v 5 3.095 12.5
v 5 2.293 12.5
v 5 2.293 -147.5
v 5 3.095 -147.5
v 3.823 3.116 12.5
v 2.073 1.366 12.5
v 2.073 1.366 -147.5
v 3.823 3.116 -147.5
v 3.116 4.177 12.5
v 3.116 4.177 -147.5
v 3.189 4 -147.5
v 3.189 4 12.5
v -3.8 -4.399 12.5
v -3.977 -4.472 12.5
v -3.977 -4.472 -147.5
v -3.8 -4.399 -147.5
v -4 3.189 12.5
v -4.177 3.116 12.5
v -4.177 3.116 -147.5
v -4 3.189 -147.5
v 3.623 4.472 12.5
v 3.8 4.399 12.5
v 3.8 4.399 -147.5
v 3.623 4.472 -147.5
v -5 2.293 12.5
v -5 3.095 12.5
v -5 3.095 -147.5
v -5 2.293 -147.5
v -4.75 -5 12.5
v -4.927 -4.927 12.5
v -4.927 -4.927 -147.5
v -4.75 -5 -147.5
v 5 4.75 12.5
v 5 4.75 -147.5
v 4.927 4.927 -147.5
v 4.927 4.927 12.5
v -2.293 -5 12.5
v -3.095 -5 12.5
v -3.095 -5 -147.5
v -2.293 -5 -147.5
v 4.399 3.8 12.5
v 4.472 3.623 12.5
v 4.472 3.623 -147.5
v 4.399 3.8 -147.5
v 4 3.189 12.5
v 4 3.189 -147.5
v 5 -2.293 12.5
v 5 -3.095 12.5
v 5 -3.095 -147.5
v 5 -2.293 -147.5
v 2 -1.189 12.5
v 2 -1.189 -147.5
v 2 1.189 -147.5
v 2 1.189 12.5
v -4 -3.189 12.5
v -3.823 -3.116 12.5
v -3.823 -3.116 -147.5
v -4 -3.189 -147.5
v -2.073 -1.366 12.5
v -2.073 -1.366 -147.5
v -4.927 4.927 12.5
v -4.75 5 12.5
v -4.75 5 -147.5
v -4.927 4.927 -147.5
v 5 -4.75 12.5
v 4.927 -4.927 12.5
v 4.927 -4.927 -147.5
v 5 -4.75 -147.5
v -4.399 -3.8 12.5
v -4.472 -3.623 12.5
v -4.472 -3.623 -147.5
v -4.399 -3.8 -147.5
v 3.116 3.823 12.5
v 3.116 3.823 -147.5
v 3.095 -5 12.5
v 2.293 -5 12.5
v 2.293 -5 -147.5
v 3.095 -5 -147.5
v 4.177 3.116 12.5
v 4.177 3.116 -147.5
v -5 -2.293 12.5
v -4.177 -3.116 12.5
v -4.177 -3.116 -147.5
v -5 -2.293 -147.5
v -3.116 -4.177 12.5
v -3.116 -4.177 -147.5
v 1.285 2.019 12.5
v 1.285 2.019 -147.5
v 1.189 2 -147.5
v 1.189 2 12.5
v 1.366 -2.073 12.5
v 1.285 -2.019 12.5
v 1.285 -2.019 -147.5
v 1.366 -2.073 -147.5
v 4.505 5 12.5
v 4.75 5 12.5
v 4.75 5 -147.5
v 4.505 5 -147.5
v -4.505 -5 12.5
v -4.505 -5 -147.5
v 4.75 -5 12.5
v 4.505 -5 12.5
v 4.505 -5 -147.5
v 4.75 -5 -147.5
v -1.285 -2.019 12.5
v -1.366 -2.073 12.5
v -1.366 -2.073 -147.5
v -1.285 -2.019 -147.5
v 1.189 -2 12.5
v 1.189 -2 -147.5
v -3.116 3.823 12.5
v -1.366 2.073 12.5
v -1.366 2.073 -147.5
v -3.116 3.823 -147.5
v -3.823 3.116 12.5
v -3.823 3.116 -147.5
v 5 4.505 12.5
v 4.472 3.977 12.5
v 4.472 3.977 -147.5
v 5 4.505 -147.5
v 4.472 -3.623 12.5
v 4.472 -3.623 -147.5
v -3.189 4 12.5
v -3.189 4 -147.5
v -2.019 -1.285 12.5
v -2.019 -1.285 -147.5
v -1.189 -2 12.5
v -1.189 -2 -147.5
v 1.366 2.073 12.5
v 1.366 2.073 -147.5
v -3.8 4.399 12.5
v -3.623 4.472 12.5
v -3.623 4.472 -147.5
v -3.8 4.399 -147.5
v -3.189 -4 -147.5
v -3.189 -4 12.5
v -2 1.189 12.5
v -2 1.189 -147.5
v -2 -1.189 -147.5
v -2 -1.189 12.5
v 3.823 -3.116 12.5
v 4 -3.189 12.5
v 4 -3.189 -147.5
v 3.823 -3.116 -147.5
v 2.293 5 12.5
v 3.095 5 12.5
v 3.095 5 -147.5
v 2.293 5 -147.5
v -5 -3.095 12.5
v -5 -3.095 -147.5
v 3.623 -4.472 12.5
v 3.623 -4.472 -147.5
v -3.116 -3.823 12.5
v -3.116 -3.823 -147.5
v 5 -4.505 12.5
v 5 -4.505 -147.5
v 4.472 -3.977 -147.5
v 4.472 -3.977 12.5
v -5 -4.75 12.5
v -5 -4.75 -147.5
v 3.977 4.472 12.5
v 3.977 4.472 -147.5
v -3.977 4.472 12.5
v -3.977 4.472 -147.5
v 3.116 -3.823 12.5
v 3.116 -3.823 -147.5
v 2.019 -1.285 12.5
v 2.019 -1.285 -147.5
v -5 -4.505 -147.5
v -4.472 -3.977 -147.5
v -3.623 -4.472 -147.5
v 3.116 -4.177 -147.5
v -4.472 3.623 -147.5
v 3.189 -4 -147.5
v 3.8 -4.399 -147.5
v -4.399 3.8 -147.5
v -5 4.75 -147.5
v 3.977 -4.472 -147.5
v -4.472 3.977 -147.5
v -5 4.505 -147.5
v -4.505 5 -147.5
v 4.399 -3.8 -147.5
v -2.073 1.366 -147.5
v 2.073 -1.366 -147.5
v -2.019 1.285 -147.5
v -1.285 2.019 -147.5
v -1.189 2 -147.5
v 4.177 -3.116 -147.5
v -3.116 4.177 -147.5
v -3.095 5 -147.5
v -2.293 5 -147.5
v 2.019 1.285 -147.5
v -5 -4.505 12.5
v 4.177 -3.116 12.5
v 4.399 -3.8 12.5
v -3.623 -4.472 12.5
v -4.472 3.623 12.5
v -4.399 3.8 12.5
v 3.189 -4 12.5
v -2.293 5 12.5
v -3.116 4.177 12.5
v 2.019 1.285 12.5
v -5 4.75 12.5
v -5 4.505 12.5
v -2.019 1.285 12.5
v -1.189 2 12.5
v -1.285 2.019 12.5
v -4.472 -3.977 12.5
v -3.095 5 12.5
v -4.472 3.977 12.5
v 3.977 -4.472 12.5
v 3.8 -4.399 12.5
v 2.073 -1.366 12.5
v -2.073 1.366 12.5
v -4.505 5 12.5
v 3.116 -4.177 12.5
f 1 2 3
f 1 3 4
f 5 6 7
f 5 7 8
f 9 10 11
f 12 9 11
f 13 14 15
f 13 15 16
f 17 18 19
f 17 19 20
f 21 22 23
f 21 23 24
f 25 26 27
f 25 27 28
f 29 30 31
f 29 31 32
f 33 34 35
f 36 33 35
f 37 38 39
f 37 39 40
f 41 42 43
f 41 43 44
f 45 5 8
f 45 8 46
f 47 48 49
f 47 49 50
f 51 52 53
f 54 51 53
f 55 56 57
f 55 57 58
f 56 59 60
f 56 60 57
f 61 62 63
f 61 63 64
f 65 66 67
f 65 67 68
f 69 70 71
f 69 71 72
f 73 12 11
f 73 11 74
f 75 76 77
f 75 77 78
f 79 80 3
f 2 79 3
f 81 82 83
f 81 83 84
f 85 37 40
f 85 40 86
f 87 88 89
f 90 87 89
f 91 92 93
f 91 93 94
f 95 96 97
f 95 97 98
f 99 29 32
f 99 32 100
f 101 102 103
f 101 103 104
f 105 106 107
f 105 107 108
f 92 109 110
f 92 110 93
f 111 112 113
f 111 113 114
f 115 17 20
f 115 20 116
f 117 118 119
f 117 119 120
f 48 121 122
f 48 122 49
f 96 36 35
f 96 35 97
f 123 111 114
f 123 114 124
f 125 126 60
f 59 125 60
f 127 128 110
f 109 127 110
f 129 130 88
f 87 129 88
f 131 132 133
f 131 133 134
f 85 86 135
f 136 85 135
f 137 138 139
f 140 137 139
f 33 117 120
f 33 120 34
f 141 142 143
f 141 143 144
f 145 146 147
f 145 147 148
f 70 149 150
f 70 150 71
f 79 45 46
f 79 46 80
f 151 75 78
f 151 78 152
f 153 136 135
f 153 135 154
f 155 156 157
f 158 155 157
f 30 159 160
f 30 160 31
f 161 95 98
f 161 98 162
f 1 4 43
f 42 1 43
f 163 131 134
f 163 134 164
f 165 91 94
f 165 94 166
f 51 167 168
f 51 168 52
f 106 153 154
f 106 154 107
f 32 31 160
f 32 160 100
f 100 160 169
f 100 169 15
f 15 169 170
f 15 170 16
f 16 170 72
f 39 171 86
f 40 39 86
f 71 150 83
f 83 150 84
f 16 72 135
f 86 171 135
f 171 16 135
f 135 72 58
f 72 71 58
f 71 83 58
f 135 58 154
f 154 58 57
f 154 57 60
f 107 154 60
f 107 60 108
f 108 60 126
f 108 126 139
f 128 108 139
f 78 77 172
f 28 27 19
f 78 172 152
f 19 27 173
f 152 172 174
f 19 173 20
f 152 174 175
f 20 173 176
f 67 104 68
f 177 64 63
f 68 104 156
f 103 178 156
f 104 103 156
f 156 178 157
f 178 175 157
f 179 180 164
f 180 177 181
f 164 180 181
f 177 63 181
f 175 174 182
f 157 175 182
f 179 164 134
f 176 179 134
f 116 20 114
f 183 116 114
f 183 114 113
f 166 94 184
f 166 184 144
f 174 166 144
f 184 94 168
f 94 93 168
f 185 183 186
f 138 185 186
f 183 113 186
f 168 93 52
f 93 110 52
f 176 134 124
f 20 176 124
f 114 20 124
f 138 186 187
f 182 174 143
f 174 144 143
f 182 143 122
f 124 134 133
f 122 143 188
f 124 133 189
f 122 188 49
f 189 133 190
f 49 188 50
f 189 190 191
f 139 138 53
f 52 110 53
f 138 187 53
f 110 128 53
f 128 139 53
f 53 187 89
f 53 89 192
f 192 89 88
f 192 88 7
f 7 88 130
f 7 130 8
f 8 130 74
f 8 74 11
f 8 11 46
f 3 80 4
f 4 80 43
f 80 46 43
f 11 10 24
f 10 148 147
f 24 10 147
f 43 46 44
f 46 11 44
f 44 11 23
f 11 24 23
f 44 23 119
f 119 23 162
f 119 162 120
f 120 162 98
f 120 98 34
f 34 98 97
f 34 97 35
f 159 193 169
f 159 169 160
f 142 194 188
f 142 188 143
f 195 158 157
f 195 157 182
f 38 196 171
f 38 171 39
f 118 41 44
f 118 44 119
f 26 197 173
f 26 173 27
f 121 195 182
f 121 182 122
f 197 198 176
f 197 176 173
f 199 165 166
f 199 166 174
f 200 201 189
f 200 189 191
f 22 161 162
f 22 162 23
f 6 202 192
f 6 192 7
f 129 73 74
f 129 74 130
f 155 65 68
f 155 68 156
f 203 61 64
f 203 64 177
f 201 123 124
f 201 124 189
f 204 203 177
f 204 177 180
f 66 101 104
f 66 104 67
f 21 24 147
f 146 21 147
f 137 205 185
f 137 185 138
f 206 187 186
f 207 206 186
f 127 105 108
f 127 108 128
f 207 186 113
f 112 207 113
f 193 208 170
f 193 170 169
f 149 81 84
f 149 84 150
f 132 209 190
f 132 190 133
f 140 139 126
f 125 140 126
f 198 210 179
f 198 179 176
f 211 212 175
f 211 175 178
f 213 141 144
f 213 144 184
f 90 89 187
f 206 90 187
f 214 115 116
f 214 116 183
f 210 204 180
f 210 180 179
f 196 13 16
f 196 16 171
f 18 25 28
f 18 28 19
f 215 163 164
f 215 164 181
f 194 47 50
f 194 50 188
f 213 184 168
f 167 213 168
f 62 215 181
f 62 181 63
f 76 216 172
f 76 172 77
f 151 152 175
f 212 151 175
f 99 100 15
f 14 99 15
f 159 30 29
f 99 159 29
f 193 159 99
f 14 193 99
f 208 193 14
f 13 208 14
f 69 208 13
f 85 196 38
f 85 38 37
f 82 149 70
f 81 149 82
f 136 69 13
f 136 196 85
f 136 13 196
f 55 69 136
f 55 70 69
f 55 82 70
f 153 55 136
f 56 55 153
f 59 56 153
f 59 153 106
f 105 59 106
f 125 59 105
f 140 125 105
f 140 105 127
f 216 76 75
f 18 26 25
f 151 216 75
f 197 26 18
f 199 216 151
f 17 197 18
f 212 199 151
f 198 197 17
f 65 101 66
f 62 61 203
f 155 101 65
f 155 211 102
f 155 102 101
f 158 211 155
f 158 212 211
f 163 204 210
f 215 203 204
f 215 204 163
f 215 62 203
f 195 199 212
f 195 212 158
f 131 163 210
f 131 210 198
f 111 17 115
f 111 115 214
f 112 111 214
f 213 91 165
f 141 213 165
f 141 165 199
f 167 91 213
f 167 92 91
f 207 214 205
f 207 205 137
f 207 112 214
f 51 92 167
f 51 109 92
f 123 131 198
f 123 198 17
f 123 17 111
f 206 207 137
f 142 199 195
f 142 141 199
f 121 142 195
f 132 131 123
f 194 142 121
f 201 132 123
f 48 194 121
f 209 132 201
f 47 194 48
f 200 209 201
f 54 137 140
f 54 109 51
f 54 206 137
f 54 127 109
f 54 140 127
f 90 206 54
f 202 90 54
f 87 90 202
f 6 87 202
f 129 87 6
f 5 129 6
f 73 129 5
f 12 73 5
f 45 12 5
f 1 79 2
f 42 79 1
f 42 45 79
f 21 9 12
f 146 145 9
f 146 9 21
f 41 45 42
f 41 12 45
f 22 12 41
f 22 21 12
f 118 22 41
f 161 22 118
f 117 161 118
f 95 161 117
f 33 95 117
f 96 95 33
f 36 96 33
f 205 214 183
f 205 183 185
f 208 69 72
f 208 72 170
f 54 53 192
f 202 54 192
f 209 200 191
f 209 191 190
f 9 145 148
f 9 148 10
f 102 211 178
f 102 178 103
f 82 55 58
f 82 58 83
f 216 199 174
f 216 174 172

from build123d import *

# Parameters (mm, degrees)
BOSS_EXTRUDE1_DEPTH = 160


with BuildPart() as part:
    # Sketch1 → Boss-Extrude1 (new body)
    with BuildSketch(Plane.XY.offset(12.500000186)):
        Polygon((1.366116014, 2.07322405), (1.28500117, 2.01905681), (1.189340837, 2.000001485), (-1.189338975, 2.000001485), (-1.284999318, 2.019056756), (-1.366115682, 2.073224527), (-3.116116726, 3.823223591), (-3.189339968, 4.000000449), (-3.116116926, 4.176777156), (-2.292893894, 5.000000654), (-3.094975438, 5.000000654), (-3.623223835, 4.471751833), (-3.800000473, 4.398528373), (-3.976777136, 4.471751755), (-4.505025989, 5.000000654), (-4.750000613, 5.000000654), (-4.926776979, 4.926776979), (-4.999999888, 4.749999847), (-4.999999888, 4.505025223), (-4.471751419, 3.976776707), (-4.398528052, 3.800000038), (-4.471751492, 3.623223494), (-4.999999888, 3.094974672), (-4.999999888, 2.292893128), (-4.176776856, 3.116116626), (-4.00000019, 3.189339768), (-3.823223291, 3.116116626), (-2.073223237, 1.366116572), (-2.019055421, 1.285000239), (-2.000000095, 1.189339906), (-2.000000095, -1.189339906), (-2.019055549, -1.284999858), (-2.073223355, -1.366116198), (-3.823223186, -3.116116476), (-4.000000075, -3.18933964), (-4.176776751, -3.116116521), (-4.999999888, -2.292893128), (-4.999999888, -3.094974672), (-4.471751396, -3.623223398), (-4.398528021, -3.800000064), (-4.471751438, -3.976776688), (-4.999999888, -4.505025223), (-4.999999888, -4.749999847), (-4.926776979, -4.926776979), (-4.750000267, -5.000000308), (-4.505025643, -5.000000308), (-3.97677715, -4.471751815), (-3.800000484, -4.398528441), (-3.623223585, -4.471751583), (-3.094975092, -5.000000308), (-2.292893548, -5.000000308), (-3.116116686, -4.176776916), (-3.18933975, -4.000000217), (-3.116116531, -3.82322335), (-1.36611571, -2.073224063), (-1.284999353, -2.019056282), (-1.189339012, -2.000000998), (1.1893408, -2.000000998), (1.285001132, -2.019056324), (1.366116572, -2.073223237), (3.116116626, -3.823223291), (3.189339768, -4.00000019), (3.116115974, -4.176777043), (2.292892709, -5.000000308), (3.094974253, -5.000000308), (3.623222862, -4.471751699), (3.799999512, -4.398528285), (3.976776334, -4.471751792), (4.505024803, -5.000000308), (4.749999427, -5.000000308), (4.926776559, -4.926777399), (4.999999468, -4.750000267), (4.999999468, -4.505025643), (4.471750616, -3.976776744), (4.398527446, -3.800000351), (4.471750859, -3.623223701), (4.999999468, -3.094975092), (4.999999468, -2.292893548), (4.176776204, -3.116116813), (4.000004057, -3.189335443), (3.823227116, -3.116112401), (2.073226072, -1.366113337), (2.019057711, -1.285002538), (2.000002386, -1.189342206), (2.000002386, 1.189337606), (2.019057753, 1.28499793), (2.073225605, 1.36611424), (3.823226425, 3.116113528), (4.000003356, 3.189336593), (4.176775948, 3.116116484), (4.999999468, 2.292892709), (4.999999468, 3.094974253), (4.471750593, 3.623223361), (4.398527601, 3.799999644), (4.471750976, 3.97677631), (4.999999468, 4.505024803), (4.999999468, 4.749999427), (4.926776213, 4.926777745), (4.749999082, 5.000000654), (4.505024457, 5.000000654), (3.976776007, 4.471752119), (3.799999416, 4.398528093), (3.623222782, 4.471751546), (3.094973907, 5.000000654), (2.292892363, 5.000000654), (3.116115883, 4.176776879), (3.189338947, 4.00000018), (3.116115845, 3.823224328), align=None)
    extrude(amount=-BOSS_EXTRUDE1_DEPTH)


solid = part.part
